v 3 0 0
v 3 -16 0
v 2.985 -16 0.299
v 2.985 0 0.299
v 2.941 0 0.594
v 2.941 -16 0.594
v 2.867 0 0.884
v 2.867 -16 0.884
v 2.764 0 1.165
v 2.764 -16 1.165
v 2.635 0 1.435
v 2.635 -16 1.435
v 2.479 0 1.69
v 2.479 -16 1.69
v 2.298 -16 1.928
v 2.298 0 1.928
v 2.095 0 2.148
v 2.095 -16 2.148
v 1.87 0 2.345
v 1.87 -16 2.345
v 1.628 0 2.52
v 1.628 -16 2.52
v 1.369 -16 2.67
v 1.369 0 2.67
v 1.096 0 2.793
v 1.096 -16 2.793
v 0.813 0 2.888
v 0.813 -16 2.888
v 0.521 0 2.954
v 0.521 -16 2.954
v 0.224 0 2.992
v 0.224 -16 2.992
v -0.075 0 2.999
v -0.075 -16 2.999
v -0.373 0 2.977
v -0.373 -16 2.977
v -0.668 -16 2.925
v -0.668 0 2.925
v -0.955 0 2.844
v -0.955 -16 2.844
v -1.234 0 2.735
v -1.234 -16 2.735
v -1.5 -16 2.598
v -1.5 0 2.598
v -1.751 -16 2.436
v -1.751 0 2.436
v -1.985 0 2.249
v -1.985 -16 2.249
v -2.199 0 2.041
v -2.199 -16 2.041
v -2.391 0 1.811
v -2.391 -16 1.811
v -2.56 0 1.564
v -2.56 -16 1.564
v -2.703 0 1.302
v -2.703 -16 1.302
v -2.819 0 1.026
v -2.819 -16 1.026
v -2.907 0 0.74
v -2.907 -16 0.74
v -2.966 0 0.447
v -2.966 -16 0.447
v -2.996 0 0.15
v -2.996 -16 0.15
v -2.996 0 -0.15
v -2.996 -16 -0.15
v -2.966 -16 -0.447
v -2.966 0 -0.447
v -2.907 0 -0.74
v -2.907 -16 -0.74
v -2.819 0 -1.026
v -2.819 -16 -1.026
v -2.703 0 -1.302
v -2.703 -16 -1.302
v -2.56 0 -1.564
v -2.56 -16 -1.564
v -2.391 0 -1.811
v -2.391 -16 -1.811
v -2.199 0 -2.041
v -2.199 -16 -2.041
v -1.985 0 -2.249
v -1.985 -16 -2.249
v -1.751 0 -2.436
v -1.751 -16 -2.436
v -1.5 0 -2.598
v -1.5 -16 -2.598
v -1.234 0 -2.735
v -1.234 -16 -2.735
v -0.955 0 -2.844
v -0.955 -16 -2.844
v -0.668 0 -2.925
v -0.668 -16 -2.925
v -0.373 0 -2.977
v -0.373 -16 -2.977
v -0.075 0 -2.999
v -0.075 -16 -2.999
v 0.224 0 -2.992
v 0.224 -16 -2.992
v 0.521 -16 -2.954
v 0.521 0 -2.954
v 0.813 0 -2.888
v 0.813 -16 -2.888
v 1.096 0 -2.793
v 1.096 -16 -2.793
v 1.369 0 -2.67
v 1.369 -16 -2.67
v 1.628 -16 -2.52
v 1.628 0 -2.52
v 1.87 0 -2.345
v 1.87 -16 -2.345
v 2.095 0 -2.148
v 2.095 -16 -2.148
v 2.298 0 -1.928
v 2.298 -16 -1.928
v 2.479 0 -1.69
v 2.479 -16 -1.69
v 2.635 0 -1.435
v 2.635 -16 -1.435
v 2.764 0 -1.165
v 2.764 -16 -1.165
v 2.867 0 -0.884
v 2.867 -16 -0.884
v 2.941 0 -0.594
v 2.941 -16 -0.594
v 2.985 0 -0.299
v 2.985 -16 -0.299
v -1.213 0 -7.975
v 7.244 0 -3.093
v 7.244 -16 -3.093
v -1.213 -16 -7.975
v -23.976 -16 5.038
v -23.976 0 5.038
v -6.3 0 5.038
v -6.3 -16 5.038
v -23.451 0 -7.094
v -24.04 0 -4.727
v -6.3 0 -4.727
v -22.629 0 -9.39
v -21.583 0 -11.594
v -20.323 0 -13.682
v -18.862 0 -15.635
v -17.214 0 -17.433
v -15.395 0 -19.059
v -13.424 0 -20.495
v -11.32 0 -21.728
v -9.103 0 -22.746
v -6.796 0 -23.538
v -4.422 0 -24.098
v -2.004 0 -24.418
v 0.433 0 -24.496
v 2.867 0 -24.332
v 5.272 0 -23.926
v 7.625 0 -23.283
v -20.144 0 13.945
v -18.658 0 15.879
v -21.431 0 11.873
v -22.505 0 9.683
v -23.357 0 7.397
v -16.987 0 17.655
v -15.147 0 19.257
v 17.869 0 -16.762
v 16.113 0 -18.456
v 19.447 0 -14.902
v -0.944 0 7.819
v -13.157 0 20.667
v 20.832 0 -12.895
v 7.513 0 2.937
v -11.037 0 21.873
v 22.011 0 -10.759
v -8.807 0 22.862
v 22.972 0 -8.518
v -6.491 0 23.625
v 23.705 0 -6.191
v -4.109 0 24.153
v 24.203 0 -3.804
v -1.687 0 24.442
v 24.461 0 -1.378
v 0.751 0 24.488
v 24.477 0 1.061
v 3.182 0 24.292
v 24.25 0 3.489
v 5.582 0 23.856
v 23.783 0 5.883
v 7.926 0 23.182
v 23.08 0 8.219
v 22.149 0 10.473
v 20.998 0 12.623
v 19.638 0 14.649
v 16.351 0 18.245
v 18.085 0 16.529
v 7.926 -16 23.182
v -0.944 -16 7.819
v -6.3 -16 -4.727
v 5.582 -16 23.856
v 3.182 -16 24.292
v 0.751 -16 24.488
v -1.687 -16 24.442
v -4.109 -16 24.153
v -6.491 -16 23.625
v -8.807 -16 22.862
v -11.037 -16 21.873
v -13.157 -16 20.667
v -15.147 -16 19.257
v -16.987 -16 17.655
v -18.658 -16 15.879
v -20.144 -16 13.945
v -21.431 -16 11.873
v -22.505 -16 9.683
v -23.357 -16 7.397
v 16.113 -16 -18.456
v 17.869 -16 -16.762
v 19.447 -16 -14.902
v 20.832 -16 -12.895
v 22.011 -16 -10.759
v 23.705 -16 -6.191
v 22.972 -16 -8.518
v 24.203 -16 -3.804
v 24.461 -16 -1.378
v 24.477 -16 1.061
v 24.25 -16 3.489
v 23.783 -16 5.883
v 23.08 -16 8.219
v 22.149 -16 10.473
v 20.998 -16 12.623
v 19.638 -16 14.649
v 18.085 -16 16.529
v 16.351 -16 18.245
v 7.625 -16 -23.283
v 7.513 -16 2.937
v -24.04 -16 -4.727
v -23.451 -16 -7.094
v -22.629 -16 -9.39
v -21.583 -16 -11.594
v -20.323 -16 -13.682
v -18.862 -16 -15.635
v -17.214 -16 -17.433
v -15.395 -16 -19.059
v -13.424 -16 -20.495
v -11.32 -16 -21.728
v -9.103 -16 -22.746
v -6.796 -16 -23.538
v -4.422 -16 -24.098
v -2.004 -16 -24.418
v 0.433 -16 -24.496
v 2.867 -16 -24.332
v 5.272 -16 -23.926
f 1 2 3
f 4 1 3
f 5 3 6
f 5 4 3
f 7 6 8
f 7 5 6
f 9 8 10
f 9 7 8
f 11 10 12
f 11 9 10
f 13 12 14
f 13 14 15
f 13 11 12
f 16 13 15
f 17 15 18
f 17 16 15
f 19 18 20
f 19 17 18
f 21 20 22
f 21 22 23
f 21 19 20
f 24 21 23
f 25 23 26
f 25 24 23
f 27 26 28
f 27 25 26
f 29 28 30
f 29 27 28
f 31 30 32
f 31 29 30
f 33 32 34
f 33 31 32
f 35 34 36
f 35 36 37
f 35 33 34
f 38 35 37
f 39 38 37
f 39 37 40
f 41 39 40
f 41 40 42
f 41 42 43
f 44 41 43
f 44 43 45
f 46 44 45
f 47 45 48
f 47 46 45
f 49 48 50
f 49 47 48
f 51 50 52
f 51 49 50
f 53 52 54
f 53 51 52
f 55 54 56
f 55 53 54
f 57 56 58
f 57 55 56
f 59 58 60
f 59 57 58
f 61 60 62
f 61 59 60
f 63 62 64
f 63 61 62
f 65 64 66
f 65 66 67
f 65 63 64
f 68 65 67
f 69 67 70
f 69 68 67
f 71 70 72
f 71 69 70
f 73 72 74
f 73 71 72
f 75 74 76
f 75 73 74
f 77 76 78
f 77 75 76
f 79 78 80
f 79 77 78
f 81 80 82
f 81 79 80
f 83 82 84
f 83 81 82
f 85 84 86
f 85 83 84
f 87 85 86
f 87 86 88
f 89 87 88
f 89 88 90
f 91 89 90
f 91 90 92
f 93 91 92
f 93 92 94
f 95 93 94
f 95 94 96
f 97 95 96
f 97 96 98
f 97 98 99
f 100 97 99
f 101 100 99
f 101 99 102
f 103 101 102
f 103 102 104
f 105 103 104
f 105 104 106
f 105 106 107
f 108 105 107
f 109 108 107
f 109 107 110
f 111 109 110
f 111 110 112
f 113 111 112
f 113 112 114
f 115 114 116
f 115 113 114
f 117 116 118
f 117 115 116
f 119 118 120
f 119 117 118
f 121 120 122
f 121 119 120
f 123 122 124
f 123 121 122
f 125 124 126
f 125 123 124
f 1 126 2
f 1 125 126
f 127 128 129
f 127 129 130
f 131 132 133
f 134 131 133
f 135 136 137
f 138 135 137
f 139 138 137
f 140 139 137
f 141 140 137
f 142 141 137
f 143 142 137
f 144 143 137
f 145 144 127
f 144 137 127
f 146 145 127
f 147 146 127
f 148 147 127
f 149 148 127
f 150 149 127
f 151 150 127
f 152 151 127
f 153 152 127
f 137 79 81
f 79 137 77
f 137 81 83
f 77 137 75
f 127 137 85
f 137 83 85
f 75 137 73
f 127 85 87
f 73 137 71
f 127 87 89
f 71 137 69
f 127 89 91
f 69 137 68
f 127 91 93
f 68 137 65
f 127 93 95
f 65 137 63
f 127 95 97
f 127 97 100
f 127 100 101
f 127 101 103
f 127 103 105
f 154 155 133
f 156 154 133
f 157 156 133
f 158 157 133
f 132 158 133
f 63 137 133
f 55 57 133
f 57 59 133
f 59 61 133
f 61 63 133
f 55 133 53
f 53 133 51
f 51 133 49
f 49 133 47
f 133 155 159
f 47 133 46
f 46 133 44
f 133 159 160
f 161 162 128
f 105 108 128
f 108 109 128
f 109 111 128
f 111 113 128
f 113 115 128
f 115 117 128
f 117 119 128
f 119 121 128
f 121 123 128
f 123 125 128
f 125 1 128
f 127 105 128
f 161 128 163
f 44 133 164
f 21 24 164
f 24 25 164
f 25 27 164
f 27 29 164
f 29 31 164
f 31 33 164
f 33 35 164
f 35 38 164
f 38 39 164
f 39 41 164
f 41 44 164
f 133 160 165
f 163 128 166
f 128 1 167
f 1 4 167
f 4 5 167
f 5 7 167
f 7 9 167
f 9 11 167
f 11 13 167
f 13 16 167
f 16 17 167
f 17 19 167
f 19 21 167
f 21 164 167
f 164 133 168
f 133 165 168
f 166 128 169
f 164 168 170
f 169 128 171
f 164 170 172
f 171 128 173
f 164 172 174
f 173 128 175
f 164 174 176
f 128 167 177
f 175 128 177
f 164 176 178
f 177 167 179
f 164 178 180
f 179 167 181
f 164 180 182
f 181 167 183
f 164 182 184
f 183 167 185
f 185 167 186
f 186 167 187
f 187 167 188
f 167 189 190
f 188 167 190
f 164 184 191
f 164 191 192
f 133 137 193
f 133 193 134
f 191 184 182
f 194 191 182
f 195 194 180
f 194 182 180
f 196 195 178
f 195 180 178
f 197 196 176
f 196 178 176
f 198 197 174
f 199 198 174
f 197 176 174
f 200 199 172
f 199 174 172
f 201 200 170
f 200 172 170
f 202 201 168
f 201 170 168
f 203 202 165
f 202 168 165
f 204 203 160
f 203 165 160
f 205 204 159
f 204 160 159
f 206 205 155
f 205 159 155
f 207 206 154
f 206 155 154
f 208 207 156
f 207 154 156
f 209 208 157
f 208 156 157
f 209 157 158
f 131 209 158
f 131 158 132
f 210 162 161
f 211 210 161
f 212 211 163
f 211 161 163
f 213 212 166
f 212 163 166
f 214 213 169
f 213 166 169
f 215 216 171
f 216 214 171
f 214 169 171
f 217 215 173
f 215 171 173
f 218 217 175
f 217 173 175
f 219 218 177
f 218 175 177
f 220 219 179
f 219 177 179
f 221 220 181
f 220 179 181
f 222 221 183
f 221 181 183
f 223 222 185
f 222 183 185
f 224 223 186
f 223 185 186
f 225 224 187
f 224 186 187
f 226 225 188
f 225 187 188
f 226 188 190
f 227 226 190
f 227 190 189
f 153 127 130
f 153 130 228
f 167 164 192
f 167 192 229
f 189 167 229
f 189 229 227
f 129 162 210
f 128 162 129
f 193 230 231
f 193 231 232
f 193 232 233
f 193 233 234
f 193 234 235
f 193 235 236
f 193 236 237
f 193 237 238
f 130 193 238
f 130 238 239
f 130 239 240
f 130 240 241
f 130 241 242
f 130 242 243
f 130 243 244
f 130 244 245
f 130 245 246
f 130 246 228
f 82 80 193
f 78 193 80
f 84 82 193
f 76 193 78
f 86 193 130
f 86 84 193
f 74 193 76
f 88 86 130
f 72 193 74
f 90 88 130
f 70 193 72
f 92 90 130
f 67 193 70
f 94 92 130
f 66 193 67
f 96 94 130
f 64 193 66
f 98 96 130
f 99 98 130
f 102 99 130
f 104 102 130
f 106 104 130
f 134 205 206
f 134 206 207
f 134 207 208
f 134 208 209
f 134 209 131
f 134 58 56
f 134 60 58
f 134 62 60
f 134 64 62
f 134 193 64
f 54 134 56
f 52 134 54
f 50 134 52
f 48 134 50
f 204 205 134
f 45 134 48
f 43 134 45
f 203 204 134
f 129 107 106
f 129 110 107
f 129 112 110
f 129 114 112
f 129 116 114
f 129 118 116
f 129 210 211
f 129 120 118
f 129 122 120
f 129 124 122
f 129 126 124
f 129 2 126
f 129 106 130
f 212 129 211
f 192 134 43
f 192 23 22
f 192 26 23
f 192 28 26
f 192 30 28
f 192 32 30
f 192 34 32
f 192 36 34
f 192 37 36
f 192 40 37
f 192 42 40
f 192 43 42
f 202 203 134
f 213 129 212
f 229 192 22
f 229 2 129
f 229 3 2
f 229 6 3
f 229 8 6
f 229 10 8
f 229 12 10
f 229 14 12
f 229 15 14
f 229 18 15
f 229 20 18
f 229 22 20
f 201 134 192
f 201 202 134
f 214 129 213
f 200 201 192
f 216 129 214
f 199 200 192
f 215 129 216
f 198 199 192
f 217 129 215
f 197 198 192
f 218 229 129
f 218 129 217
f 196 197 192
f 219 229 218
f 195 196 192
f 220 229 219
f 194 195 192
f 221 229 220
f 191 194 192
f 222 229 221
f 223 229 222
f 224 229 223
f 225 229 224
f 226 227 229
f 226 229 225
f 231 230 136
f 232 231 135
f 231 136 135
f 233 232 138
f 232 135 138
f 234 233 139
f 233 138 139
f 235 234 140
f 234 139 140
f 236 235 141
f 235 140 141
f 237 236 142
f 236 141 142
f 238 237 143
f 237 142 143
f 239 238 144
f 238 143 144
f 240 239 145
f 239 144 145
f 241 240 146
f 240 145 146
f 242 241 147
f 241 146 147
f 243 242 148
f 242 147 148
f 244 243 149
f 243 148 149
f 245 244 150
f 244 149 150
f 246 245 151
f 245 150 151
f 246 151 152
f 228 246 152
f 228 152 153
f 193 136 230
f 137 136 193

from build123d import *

# Parameters (mm, degrees)
F0_R     = 24.5
F0_R_2   = 3
F1_DEPTH = 16
F2_W     = 26.459999
F2_H     = 9.765
F3_DEPTH = 25


with BuildPart() as f1:
    # F0 (on Front) → F1 (new body)
    with BuildSketch(Plane.XZ):
        Circle(F0_R)
        Circle(F0_R_2, mode=Mode.SUBTRACT)
    extrude(amount=F1_DEPTH)

    # F2 (on Front) → F3 (cut)
    with BuildSketch(Plane.XZ):
        Polygon((7.513219, 2.936858), (20.743218, 25.851889), (12.28648, 30.734389), (-0.943519, 7.819358), align=None)
        Polygon((-1.213216, -7.975067), (12.016783, -30.890099), (20.473521, -26.007599), (7.243522, -3.092567), align=None)
        with Locations((-19.530002, 0.15571)):
            Rectangle(F2_W, F2_H)
    extrude(amount=F3_DEPTH, mode=Mode.SUBTRACT)


solid = f1.part
